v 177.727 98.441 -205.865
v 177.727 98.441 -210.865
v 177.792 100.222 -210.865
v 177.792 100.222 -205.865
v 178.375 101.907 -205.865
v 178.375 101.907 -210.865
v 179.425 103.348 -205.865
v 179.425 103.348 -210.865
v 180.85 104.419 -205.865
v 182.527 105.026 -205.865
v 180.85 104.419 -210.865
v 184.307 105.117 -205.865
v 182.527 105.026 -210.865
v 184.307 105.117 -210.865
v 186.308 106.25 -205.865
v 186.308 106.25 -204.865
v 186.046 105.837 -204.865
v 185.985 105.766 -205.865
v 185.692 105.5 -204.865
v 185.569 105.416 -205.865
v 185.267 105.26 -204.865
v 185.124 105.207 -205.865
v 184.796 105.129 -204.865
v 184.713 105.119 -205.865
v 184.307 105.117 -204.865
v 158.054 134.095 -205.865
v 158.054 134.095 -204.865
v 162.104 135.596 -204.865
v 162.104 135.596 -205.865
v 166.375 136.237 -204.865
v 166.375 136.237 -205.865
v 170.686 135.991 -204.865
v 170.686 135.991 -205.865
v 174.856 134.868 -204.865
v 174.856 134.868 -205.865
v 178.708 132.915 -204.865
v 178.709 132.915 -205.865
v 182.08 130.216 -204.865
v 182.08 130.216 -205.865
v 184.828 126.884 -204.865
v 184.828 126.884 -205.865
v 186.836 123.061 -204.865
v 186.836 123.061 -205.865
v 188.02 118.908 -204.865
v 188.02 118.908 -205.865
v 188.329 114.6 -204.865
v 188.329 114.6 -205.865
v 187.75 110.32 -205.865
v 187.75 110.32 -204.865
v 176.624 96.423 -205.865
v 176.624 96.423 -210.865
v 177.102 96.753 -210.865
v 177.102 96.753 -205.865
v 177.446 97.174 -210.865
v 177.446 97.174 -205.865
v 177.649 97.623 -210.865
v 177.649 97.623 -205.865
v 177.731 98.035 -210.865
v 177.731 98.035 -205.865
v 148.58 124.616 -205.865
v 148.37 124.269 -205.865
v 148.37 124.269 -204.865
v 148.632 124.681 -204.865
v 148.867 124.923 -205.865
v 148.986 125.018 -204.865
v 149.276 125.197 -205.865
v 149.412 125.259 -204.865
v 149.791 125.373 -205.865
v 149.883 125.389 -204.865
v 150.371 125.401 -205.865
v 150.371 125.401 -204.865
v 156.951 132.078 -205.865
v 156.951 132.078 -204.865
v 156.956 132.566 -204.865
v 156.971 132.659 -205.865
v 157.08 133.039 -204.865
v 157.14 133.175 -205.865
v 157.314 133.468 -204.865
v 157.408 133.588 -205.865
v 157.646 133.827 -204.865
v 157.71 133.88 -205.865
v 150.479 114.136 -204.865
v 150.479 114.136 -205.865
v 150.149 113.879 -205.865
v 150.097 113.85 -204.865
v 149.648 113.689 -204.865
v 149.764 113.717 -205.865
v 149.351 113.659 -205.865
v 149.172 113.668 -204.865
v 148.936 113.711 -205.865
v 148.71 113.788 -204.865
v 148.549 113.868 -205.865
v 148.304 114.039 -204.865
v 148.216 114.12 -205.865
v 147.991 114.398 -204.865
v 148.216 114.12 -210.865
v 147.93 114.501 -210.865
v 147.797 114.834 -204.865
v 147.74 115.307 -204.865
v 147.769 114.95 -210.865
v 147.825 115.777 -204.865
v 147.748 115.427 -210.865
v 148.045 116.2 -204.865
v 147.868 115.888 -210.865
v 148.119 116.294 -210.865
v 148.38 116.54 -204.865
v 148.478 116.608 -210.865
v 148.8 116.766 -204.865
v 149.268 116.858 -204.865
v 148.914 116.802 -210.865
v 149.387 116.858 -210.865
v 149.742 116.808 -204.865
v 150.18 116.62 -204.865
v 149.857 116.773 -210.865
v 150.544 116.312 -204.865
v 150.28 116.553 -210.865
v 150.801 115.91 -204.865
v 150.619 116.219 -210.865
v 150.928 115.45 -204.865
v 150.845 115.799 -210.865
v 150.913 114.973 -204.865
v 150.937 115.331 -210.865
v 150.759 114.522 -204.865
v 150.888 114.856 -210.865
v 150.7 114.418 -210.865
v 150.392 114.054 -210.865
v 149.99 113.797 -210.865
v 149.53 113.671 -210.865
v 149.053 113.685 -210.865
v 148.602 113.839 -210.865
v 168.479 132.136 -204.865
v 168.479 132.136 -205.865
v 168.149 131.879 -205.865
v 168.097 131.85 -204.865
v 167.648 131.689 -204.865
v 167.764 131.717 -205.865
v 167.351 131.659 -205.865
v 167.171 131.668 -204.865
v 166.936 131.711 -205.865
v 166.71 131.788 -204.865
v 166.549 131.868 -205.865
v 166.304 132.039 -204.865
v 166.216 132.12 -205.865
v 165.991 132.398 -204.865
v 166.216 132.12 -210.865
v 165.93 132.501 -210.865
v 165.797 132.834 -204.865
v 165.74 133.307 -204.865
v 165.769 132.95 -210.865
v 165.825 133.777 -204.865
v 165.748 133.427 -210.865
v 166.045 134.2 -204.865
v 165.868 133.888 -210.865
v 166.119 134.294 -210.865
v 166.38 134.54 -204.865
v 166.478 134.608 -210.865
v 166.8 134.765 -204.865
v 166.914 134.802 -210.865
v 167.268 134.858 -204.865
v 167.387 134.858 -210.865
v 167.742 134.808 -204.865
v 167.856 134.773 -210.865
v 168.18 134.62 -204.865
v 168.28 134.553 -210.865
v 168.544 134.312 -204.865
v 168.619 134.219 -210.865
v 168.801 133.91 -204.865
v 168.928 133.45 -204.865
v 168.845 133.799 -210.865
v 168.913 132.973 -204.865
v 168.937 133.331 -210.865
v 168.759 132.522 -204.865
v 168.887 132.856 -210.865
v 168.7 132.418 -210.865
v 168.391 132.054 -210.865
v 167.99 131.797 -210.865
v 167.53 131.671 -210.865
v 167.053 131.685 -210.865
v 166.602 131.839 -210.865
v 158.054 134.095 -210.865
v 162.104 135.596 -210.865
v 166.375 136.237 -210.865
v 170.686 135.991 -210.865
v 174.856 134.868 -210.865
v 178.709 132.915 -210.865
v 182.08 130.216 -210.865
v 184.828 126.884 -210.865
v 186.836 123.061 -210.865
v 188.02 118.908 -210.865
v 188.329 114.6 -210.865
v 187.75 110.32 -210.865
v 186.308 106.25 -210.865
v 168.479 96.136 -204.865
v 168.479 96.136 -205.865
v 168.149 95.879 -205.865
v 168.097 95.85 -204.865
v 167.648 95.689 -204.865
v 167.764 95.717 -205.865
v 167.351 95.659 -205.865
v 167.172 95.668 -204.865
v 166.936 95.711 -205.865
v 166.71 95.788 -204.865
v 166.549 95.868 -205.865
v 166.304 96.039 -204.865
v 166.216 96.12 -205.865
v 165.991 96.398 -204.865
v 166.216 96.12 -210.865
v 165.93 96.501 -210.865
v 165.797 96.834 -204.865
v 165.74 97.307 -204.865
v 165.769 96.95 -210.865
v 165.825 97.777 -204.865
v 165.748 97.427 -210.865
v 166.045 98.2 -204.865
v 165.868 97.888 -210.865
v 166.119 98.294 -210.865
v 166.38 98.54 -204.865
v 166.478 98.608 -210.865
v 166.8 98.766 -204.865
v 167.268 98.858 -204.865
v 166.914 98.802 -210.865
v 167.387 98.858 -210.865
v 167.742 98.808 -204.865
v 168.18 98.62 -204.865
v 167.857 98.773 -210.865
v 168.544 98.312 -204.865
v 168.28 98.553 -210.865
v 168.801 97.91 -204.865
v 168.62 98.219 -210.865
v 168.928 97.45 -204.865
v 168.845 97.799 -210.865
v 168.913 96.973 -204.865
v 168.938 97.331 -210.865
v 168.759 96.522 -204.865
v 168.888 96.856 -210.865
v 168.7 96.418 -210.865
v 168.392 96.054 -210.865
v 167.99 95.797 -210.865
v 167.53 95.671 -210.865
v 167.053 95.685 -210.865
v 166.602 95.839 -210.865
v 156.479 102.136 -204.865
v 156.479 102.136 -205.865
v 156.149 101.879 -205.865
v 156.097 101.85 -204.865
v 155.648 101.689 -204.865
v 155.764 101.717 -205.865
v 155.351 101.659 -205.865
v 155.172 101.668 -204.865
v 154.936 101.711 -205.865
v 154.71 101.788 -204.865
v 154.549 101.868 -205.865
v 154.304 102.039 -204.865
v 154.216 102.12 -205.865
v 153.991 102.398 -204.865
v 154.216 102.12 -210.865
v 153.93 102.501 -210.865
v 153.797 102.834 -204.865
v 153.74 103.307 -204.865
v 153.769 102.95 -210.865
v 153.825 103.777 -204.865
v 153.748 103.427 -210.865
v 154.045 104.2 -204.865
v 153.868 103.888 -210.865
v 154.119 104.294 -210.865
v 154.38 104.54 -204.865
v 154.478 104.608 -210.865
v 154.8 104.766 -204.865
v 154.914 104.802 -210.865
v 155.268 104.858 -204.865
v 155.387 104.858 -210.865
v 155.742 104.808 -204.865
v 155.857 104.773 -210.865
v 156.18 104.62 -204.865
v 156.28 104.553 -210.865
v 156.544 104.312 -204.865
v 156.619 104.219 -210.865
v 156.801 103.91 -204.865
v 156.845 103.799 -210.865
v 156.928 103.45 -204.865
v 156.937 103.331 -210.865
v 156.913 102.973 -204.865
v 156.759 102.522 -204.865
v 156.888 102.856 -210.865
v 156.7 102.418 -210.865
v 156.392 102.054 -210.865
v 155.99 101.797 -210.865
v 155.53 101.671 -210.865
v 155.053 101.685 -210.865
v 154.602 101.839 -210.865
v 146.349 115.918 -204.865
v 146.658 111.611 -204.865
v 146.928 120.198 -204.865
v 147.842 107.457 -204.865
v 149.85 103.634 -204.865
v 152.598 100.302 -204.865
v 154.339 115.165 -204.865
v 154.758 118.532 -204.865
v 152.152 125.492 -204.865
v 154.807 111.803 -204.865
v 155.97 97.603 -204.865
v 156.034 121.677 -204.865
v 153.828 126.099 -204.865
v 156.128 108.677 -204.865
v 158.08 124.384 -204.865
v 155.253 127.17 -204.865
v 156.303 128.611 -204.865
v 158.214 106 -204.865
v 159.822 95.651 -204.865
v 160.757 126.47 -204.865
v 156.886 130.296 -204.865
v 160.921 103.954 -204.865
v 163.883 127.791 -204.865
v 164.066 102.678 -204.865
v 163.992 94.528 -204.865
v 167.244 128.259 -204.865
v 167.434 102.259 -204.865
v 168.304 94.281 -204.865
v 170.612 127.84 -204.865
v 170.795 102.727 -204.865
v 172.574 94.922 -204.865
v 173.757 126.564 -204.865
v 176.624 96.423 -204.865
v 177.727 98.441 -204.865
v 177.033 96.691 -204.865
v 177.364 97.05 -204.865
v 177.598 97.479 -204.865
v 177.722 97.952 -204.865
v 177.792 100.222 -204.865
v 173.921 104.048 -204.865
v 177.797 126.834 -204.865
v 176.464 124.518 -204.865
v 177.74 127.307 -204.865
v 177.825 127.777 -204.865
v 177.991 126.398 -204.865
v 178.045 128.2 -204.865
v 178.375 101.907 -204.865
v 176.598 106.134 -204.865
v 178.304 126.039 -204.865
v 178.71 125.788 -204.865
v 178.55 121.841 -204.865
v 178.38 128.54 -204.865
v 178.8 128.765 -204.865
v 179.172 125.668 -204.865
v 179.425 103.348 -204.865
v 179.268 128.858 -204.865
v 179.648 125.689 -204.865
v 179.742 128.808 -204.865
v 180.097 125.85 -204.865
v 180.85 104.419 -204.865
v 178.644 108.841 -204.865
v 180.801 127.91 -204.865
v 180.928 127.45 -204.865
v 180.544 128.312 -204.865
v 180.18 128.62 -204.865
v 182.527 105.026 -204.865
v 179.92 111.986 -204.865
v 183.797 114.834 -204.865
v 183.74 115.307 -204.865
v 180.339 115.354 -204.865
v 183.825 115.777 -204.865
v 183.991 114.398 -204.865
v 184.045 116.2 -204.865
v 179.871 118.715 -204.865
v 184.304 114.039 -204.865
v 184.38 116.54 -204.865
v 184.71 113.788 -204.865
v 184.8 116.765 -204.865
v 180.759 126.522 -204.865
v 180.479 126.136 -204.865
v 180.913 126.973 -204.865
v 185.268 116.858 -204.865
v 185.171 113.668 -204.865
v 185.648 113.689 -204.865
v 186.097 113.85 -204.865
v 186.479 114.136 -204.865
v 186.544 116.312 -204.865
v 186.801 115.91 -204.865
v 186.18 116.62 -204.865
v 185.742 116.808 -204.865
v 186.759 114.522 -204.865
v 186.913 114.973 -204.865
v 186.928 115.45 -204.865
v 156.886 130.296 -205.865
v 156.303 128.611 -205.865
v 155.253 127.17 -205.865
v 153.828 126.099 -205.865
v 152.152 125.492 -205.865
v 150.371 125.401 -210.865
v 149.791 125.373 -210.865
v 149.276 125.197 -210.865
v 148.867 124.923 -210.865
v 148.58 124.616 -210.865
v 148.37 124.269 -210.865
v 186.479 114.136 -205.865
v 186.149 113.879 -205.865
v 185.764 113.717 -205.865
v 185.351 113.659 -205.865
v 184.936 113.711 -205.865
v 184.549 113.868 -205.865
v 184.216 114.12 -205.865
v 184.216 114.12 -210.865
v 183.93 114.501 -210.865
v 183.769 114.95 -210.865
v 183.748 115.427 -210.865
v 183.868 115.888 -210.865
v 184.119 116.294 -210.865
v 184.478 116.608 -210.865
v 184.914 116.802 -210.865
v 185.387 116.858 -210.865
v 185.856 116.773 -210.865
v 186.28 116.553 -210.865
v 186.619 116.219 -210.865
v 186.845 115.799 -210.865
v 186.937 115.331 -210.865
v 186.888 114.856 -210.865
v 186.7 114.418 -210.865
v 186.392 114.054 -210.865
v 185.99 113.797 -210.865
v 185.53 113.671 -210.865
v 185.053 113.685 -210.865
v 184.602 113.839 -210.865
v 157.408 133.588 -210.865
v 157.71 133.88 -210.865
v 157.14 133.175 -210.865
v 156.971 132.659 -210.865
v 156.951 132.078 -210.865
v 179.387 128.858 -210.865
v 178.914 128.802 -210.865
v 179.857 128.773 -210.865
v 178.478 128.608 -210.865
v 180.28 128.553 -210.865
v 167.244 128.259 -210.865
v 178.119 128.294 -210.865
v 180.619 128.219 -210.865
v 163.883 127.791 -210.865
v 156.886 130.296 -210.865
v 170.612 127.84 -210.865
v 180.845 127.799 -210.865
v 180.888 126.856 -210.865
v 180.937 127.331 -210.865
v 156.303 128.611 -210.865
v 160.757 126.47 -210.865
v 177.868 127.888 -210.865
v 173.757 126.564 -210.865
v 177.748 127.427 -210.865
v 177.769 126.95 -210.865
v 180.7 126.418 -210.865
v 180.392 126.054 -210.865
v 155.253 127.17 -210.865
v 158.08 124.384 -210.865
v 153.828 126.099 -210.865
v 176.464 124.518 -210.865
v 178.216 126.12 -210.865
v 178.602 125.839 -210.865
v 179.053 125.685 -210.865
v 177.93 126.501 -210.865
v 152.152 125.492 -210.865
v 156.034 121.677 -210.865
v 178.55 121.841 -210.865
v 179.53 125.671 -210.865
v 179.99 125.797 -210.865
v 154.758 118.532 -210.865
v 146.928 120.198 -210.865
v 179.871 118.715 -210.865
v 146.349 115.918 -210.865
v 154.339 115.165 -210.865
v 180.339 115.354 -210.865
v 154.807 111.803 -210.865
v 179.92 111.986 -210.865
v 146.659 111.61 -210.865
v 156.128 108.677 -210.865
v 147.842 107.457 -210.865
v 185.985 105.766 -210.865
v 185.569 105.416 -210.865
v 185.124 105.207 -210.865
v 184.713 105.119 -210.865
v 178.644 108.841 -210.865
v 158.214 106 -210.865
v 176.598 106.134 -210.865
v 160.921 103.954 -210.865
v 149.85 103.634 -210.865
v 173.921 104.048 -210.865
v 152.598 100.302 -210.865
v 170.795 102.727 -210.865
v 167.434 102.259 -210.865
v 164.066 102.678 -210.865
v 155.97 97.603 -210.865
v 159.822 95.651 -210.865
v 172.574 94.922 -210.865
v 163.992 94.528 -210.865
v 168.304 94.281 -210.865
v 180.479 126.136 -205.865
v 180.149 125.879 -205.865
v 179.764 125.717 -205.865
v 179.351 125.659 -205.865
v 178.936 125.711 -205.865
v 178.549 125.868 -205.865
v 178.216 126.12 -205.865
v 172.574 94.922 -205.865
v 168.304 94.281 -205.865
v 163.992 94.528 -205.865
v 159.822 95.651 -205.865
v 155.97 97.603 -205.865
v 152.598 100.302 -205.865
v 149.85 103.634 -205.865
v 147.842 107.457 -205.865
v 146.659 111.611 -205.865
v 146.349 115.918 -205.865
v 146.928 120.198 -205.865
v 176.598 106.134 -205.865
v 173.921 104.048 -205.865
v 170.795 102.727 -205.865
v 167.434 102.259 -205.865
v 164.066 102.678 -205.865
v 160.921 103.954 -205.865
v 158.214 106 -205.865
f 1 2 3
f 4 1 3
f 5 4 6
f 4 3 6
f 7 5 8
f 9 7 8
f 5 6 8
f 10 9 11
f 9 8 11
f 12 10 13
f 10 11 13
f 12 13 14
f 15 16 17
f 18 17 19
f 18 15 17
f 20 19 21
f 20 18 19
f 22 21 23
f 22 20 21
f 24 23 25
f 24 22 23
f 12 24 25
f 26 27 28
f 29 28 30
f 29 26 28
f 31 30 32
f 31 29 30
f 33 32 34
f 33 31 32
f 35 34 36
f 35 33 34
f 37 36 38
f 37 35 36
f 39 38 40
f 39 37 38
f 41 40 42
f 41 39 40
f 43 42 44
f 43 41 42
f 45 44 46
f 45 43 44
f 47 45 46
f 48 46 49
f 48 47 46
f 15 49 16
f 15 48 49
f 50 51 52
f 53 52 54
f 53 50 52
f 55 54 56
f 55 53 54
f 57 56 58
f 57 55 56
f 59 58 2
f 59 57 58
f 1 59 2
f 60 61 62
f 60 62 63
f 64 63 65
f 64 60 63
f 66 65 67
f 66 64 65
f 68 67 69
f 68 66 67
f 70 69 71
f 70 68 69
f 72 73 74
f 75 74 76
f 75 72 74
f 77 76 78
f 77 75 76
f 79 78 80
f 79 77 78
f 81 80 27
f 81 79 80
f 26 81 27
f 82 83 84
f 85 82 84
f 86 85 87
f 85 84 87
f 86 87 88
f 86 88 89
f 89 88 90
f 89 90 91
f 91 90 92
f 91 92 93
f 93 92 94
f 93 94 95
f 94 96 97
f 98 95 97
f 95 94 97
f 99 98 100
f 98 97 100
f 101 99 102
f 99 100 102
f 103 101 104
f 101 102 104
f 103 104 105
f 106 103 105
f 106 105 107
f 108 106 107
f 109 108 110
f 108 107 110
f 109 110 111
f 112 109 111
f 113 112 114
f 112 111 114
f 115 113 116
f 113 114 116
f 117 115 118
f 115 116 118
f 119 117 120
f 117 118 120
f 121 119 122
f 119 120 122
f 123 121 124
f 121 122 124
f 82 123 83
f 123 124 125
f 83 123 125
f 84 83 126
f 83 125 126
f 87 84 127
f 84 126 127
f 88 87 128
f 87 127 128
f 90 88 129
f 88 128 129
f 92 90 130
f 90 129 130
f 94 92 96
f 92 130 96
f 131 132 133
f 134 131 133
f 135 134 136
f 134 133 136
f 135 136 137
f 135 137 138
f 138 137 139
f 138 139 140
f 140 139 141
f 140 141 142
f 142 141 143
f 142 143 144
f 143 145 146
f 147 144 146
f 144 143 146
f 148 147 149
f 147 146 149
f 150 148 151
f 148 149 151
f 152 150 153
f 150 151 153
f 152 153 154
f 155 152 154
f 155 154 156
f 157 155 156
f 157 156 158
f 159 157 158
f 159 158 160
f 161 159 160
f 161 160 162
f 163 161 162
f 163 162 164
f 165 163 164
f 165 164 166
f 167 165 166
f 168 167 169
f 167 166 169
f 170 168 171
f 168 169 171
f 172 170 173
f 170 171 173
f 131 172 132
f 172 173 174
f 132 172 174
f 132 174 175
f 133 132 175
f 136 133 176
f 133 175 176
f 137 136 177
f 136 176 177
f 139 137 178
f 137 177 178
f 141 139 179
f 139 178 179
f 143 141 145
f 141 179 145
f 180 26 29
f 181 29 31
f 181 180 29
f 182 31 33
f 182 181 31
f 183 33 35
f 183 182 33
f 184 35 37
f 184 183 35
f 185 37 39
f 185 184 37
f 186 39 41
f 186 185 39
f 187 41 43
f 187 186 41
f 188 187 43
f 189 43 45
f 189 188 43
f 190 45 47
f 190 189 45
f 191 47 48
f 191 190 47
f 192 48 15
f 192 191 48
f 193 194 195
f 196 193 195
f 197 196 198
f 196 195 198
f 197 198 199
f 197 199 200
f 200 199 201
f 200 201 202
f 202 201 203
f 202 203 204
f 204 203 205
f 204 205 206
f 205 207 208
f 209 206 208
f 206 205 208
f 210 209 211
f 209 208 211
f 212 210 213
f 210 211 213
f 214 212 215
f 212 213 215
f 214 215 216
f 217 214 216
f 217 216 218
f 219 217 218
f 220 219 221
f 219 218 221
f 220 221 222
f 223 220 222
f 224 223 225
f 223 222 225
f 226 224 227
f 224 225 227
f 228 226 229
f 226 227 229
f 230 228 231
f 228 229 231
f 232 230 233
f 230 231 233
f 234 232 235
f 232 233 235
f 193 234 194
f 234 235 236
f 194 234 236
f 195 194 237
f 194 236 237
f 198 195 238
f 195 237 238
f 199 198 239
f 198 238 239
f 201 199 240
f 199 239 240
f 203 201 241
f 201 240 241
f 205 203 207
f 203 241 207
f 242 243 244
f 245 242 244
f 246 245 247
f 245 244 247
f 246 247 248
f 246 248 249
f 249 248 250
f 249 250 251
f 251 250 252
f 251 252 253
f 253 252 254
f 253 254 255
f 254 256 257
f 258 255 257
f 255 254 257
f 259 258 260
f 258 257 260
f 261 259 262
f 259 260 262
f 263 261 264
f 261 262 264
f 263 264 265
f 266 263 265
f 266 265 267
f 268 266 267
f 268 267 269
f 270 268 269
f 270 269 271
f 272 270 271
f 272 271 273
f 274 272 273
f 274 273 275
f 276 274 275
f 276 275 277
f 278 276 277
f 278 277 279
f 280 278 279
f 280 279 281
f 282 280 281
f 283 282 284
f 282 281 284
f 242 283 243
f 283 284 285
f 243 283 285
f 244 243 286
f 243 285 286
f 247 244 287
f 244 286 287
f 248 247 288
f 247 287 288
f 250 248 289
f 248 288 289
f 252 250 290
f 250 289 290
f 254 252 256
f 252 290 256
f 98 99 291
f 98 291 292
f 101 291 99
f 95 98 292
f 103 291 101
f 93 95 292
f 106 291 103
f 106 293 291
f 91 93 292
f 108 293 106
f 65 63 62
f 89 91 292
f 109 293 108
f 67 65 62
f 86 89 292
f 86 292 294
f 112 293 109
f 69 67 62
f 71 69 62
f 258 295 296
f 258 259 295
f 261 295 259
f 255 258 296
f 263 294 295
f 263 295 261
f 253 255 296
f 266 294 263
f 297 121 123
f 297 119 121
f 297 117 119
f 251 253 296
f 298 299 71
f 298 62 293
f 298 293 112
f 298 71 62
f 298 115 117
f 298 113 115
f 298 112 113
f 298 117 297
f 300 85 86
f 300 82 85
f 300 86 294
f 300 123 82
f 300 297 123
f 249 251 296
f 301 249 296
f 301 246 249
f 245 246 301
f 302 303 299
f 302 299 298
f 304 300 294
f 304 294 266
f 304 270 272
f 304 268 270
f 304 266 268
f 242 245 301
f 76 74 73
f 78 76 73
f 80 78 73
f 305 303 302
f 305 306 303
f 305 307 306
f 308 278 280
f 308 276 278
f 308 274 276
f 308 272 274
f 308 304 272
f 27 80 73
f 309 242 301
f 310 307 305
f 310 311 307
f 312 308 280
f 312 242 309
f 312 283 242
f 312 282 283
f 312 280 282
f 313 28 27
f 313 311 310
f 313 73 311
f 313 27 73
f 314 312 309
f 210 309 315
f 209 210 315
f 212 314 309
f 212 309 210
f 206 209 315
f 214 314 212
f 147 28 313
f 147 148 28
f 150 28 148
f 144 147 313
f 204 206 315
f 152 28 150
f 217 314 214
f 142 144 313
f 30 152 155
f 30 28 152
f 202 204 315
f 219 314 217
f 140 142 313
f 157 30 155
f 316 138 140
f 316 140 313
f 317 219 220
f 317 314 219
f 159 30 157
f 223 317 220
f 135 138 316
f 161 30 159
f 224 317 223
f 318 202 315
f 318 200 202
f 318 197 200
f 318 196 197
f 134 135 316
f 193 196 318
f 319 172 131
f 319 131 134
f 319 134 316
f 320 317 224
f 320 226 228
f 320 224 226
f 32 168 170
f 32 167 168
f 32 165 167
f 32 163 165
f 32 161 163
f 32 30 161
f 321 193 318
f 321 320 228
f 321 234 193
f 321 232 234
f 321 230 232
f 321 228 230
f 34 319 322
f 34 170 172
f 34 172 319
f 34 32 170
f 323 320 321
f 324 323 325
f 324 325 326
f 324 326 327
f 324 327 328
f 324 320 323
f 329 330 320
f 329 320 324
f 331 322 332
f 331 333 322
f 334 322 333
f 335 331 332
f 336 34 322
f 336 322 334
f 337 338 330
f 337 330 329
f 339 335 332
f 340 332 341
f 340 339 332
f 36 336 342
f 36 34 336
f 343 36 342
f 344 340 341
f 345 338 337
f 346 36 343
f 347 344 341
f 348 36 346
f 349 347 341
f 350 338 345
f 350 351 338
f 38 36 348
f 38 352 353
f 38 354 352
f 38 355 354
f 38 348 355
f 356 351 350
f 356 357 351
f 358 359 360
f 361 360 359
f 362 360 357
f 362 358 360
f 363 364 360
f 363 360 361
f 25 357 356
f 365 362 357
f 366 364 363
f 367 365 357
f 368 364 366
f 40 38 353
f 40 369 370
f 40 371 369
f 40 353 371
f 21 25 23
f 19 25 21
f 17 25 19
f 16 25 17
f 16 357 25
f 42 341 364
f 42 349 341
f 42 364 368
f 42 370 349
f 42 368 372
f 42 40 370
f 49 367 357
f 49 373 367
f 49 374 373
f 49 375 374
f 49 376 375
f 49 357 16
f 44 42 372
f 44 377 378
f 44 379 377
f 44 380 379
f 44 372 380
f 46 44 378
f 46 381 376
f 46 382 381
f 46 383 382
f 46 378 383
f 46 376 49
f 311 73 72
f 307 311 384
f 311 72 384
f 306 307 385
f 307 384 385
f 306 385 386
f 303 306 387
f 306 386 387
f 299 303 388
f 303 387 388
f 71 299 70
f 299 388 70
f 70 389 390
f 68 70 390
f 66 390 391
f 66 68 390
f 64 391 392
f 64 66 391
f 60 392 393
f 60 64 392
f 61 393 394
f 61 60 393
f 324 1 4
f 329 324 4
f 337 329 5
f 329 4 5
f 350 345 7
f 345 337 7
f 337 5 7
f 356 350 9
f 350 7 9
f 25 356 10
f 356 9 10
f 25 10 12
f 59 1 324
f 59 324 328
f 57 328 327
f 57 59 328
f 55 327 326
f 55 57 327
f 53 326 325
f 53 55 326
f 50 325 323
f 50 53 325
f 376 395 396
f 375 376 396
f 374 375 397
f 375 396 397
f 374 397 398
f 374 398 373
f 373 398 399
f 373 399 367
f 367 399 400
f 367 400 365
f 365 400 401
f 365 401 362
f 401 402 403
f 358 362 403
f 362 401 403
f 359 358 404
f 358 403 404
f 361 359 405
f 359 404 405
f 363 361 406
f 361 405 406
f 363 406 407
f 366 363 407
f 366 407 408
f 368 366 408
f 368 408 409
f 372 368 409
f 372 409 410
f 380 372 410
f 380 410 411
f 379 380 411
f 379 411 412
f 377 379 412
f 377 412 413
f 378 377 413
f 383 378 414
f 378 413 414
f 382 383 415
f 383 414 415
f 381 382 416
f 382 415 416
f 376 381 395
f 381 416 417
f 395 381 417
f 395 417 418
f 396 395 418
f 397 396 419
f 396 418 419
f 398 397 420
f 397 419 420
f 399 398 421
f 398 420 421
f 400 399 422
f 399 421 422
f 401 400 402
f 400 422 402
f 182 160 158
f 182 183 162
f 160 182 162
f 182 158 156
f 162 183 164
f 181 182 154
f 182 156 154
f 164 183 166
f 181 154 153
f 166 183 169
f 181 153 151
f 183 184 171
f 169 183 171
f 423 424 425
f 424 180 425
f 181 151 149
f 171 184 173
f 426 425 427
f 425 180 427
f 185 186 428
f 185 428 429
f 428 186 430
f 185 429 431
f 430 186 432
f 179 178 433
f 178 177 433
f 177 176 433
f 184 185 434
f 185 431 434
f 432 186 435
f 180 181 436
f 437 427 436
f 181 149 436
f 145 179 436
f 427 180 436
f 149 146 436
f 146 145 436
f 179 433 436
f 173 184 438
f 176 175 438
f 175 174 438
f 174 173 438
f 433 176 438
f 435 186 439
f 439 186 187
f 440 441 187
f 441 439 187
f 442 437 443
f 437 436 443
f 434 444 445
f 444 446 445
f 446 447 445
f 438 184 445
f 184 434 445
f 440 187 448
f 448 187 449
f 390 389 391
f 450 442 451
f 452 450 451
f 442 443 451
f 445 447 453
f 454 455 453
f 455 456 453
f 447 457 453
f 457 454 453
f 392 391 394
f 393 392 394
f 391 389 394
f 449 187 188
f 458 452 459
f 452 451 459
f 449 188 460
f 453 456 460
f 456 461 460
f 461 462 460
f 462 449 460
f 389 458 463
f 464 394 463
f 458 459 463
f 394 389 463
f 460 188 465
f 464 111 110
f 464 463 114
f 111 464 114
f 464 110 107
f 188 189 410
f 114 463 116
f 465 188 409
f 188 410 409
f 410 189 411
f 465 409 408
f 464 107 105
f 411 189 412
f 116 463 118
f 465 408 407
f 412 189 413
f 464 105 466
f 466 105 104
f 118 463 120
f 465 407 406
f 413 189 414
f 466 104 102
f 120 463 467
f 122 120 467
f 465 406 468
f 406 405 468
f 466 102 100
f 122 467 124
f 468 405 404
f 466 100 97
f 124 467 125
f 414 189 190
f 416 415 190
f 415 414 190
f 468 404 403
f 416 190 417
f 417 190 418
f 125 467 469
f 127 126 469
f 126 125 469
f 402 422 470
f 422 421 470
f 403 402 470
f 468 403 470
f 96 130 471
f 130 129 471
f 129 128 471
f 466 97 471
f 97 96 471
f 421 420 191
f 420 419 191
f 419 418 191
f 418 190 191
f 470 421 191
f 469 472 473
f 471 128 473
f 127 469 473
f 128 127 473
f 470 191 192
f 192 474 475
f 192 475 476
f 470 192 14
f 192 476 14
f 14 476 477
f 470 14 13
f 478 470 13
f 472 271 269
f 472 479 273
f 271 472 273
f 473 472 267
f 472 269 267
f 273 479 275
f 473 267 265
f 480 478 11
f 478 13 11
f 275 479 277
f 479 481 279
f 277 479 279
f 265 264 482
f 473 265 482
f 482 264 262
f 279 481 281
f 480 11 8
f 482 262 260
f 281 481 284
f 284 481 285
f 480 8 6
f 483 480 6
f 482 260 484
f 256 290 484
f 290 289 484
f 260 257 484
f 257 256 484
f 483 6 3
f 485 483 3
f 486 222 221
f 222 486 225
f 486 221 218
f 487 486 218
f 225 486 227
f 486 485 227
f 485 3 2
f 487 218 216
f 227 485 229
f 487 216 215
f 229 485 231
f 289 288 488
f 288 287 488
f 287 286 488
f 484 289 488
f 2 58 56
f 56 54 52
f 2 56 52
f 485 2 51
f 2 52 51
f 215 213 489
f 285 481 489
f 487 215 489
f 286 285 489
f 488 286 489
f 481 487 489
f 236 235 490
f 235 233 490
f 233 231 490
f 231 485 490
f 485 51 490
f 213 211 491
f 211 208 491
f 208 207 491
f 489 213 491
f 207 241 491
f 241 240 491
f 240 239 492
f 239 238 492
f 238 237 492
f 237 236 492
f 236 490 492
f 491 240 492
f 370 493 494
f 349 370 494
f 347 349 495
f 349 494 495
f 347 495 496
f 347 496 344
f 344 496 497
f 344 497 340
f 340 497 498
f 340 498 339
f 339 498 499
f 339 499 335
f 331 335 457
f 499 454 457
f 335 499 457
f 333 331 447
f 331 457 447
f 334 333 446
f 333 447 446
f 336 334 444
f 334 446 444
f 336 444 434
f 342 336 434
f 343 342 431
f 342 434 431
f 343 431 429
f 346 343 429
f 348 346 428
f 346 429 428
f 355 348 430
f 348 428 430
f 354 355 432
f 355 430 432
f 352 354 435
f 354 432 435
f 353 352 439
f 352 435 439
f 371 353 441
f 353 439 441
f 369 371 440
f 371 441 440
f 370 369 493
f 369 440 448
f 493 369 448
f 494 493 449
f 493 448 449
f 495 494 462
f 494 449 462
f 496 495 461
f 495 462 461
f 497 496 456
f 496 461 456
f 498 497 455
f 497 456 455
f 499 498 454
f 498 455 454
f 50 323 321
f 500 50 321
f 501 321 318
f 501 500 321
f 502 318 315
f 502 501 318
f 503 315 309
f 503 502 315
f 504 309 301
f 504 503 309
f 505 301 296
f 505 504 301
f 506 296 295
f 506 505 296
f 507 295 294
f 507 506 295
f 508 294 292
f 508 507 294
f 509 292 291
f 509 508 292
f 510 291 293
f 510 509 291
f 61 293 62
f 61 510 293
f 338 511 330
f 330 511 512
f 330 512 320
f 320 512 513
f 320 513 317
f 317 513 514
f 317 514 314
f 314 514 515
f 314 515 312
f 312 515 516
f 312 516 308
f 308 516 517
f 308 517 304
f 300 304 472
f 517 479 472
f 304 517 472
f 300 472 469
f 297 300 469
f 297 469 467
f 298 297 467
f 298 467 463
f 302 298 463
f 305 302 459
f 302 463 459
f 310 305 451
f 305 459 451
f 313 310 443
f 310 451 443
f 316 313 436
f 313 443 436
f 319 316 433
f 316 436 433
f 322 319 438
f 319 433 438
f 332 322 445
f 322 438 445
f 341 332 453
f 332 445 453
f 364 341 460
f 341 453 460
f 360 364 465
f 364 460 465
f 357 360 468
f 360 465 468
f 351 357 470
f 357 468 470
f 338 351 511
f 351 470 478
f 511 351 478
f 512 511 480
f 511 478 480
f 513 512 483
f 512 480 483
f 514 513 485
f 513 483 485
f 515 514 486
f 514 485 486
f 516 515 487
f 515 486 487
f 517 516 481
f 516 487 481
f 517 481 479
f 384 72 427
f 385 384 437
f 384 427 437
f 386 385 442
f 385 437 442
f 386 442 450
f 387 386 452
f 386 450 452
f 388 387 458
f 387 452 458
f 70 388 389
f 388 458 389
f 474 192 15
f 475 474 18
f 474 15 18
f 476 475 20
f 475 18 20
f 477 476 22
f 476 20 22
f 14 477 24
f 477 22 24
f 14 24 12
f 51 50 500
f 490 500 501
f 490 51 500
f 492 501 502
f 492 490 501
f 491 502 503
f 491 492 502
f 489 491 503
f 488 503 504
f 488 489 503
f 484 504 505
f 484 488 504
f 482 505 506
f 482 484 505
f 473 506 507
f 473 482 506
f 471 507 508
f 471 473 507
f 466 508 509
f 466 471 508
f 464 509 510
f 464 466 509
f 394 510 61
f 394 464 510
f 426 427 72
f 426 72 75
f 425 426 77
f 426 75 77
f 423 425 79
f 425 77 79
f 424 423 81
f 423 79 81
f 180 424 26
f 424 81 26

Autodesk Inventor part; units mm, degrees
ref_plane "YZ Plane" through (0, 0, 0) normal (1, 0, 0) x (0, 1, 0)
ref_plane "XZ Plane" through (0, 0, 0) normal (0, 1, 0) x (-1, 0, 0)
ref_plane "작업 평면1" through (168.9405, 113.6809, -210.8653) normal (0, 0, 1) x (-0.7019406, -0.7122354, 0)
sketch "스케치1" plane through (168.9405, 113.6809, -210.8653) normal (0, 0, 1) x (-0.7019406, -0.7122354, 0)
  circle A0 centre (0, -25.2484) radius 3 projected
  circle A1 centre (0, -2.2484) radius 13 projected
  circle A2 centre (-12.6349, 10.5718) radius 1.6 projected
  circle A3 centre (12.6349, -15.0687) radius 1.6 projected
  circle A4 centre (0.1235, 14.7217) radius 1.6 projected
  circle A5 centre (-0.1235, -19.2186) radius 1.6 projected
  circle A6 centre (-16.9701, -2.1249) radius 1.6 projected
  circle A7 centre (16.9701, -2.372) radius 1.6 projected
  circle A8 centre (12.8202, 10.3865) radius 1.6 projected
  circle A9 centre (-12.8202, -14.8834) radius 1.6 projected
  circle A10 centre (0, 20.7516) radius 3 projected
  arc A11 (-2.0317, -50.1272) -> (-0.57, -54.2453) centre (7.4248, -49.0892) ccw projected
  line L0 (0.57, -54.2453) -> (-0.57, -54.2453) projected
  arc A12 (0.57, -54.2453) -> (2.0317, -50.1272) centre (-7.4248, -49.0892) ccw projected
  arc A13 (2.5023, -49.6825) -> (2.0317, -50.1272) centre (2.5287, -50.1818) ccw projected
  arc A14 (2.5023, -49.6825) -> (3.4624, -49.6221) centre (0, -2.2484) ccw projected
  arc A15 (3.9852, -50.0043) -> (3.4624, -49.6221) centre (3.4989, -50.1207) ccw projected
  arc A16 (3.9852, -50.0043) -> (5.9514, -53.9067) centre (13.237, -47.7893) ccw projected
  line L1 (7.0824, -53.7639) -> (5.9514, -53.9067) projected
  arc A17 (7.0824, -53.7639) -> (8.0165, -49.4951) centre (-1.4956, -49.6504) ccw projected
  arc A18 (8.4277, -48.9948) -> (8.0165, -49.4951) centre (8.5164, -49.4869) ccw projected
  arc A19 (8.4277, -48.9948) -> (9.3726, -48.8146) centre (0, -2.2484) ccw projected
  arc A20 (9.9391, -49.1283) -> (9.3726, -48.8146) centre (9.4713, -49.3047) ccw projected
  arc A21 (9.9391, -49.1283) -> (12.379, -52.7535) centre (18.8404, -45.7711) ccw projected
  line L2 (13.4832, -52.47) -> (12.379, -52.7535) projected
  arc A22 (13.4832, -52.47) -> (13.8748, -48.1178) centre (4.4572, -49.4641) ccw projected
  arc A23 (14.2201, -47.5699) -> (13.8748, -48.1178) centre (14.3698, -48.047) ccw projected
  arc A24 (14.2201, -47.5699) -> (15.135, -47.2727) centre (0, -2.2484) ccw projected
  arc A25 (15.7364, -47.5129) -> (15.135, -47.2727) centre (15.2943, -47.7466) ccw projected
  arc A26 (15.7364, -47.5129) -> (18.6114, -50.8037) centre (24.1467, -43.0666) ccw projected
  line L3 (19.6713, -50.3841) -> (18.6114, -50.8037) projected
  arc A27 (19.6713, -50.3841) -> (19.5144, -46.0171) centre (10.3398, -48.5331) ccw projected
  arc A28 (19.7883, -45.4303) -> (19.5144, -46.0171) centre (19.9966, -45.8849) ccw projected
  arc A29 (19.7883, -45.4303) -> (20.6587, -45.0207) centre (0, -2.2484) ccw projected
  arc A30 (21.2854, -45.1837) -> (20.6587, -45.0207) centre (20.8762, -45.471) ccw projected
  arc A31 (21.2854, -45.1837) -> (24.5502, -48.0882) centre (29.0721, -39.7184) ccw projected
  line L4 (25.5492, -47.539) -> (24.5502, -48.0882) projected
  arc A32 (25.5492, -47.539) -> (24.8461, -43.2262) centre (16.0593, -46.8722) ccw projected
  arc A33 (25.0443, -42.6097) -> (24.8461, -43.2262) centre (25.308, -43.0345) ccw projected
  arc A34 (25.0443, -42.6097) -> (25.8566, -42.0942) centre (0, -2.2484) ccw projected
  arc A35 (26.4988, -42.1774) -> (25.8566, -42.0942) centre (26.1288, -42.5137) ccw projected
  arc A36 (26.4988, -42.1774) -> (30.1019, -44.6498) centre (33.5391, -35.7792) ccw projected
  line L5 (31.0241, -43.9798) -> (30.1019, -44.6498) projected
  arc A37 (31.0241, -43.9798) -> (29.7861, -39.789) centre (21.5255, -44.5076) ccw projected
  arc A38 (29.9055, -39.1525) -> (29.7861, -39.789) centre (30.2203, -39.541) ccw projected
  arc A39 (29.9055, -39.1525) -> (30.6467, -38.5393) centre (0, -2.2484) ccw projected
  arc A40 (31.2943, -38.5413) -> (30.6467, -38.5393) centre (30.9693, -38.9213) ccw projected
  arc A41 (31.2943, -38.5413) -> (35.1788, -40.5427) centre (37.4772, -31.3112) ccw projected
  line L6 (36.0098, -39.7623) -> (35.1788, -40.5427) projected
  arc A42 (36.0098, -39.7623) -> (34.2563, -35.7598) centre (26.6522, -41.4765) ccw projected
  arc A43 (34.295, -35.1134) -> (34.2563, -35.7598) centre (34.656, -35.4593) ccw projected
  arc A44 (34.295, -35.1134) -> (34.9535, -34.4121) centre (0, -2.2484) ccw projected
  arc A45 (35.5962, -34.333) -> (34.9535, -34.4121) centre (35.3214, -34.7507) ccw projected
  arc A46 (35.5962, -34.333) -> (39.7009, -35.8317) centre (40.8242, -26.3849) ccw projected
  line L7 (40.4276, -34.9533) -> (39.7009, -35.8317) projected
  arc A47 (40.4276, -34.9533) -> (38.1863, -31.2021) centre (31.3586, -37.8268) ccw projected
  arc A48 (38.1436, -30.5559) -> (38.1863, -31.2021) centre (38.5451, -30.8539) ccw projected
  arc A49 (38.1436, -30.5559) -> (38.7091, -29.7777) centre (0, -2.2484) ccw projected
  arc A50 (39.3368, -29.6186) -> (38.7091, -29.7777) centre (39.1165, -30.0674) ccw projected
  arc A51 (39.3368, -29.6186) -> (43.597, -30.591) centre (43.5274, -21.078) ccw projected
  line L8 (44.2078, -29.6285) -> (43.597, -30.591) projected
  arc A52 (44.2078, -29.6285) -> (41.514, -26.1878) centre (35.5705, -33.616) ccw projected
  arc A53 (41.3907, -25.5521) -> (41.514, -26.1878) centre (41.8264, -25.7974) ccw projected
  arc A54 (41.3907, -25.5521) -> (41.8542, -24.7091) centre (0, -2.2484) ccw projected
  arc A55 (42.457, -24.4725) -> (41.8542, -24.7091) centre (42.2947, -24.9455) ccw projected
  arc A56 (42.457, -24.4725) -> (46.8055, -24.9034) centre (45.5441, -15.4741) ccw projected
  line L9 (47.2909, -23.8719) -> (46.8055, -24.9034) projected
  arc A57 (47.2909, -23.8719) -> (44.1871, -20.7959) centre (39.2214, -28.9105) ccw projected
  arc A58 (43.985, -20.1807) -> (44.1871, -20.7959) centre (44.4481, -20.3694) ccw projected
  arc A59 (43.985, -20.1807) -> (44.3392, -19.2862) centre (0, -2.2484) ccw projected
  arc A60 (44.9076, -18.976) -> (44.3392, -19.2862) centre (44.8059, -19.4656) ccw projected
  arc A61 (44.9076, -18.976) -> (49.2758, -18.8585) centre (46.8426, -9.6616) ccw projected
  line L10 (49.6281, -17.7743) -> (49.2758, -18.8585) projected
  arc A62 (49.6281, -17.7743) -> (46.1633, -15.1116) centre (42.2538, -23.7845) ccw projected
  arc A63 (45.8857, -14.5265) -> (46.1633, -15.1116) centre (46.3687, -14.6557) ccw projected
  arc A64 (45.8857, -14.5265) -> (46.125, -13.5947) centre (0, -2.2484) ccw projected
  arc A65 (46.65, -13.2157) -> (46.125, -13.5947) centre (46.6105, -13.7141) ccw projected
  arc A66 (46.65, -13.2157) -> (50.9691, -12.5516) centre (47.4023, -3.7322) ccw projected
  line L11 (51.1827, -11.4318) -> (50.9691, -12.5516) projected
  arc A67 (51.1827, -11.4318) -> (47.4114, -9.2243) centre (44.6198, -18.3188) ccw projected
  arc A68 (47.0627, -8.6787) -> (47.4114, -9.2243) centre (47.5581, -8.7464) ccw projected
  arc A69 (47.0627, -8.6787) -> (47.1833, -7.7243) centre (0, -2.2484) ccw projected
  arc A70 (47.6567, -7.2824) -> (47.1833, -7.7243) centre (47.68, -7.7819) ccw projected
  arc A71 (47.6567, -7.2824) -> (51.8585, -6.0822) centre (47.2145, 2.2206) ccw projected
  line L12 (51.9301, -4.9445) -> (51.8585, -6.0822) projected
  arc A72 (51.9301, -4.9445) -> (47.9119, -3.2271) centre (46.2821, -12.5998) ccw projected
  arc A73 (47.4976, -2.7294) -> (47.9119, -3.2271) centre (47.9975, -2.7345) ccw projected
  arc A74 (47.4976, -2.7294) -> (47.4976, -1.7674) centre (0, -2.2484) ccw projected
  arc A75 (47.9119, -1.2698) -> (47.4976, -1.7674) centre (47.9975, -1.7624) ccw projected
  arc A76 (47.9119, -1.2698) -> (51.9301, 0.4476) centre (46.2821, 8.1029) ccw projected
  line L13 (51.8585, 1.5853) -> (51.9301, 0.4476) projected
  arc A77 (51.8585, 1.5853) -> (47.6567, 2.7856) centre (47.2145, -6.7175) ccw projected
  arc A78 (47.1833, 3.2274) -> (47.6567, 2.7856) centre (47.68, 3.285) ccw projected
  arc A79 (47.1833, 3.2274) -> (47.0627, 4.1818) centre (0, -2.2484) ccw projected
  arc A80 (47.4114, 4.7275) -> (47.0627, 4.1818) centre (47.5581, 4.2495) ccw projected
  arc A81 (47.4114, 4.7275) -> (51.1827, 6.9349) centre (44.6198, 13.822) ccw projected
  line L14 (50.9691, 8.0547) -> (51.1827, 6.9349) projected
  arc A82 (50.9691, 8.0547) -> (46.65, 8.7188) centre (47.4023, -0.7647) ccw projected
  arc A83 (46.125, 9.0978) -> (46.65, 8.7188) centre (46.6105, 9.2173) ccw projected
  arc A84 (46.125, 9.0978) -> (45.8857, 10.0296) centre (0, -2.2484) ccw projected
  arc A85 (46.1633, 10.6147) -> (45.8857, 10.0296) centre (46.3687, 10.1589) ccw projected
  arc A86 (46.1633, 10.6147) -> (49.6281, 13.2774) centre (42.2538, 19.2876) ccw projected
  line L15 (49.2758, 14.3616) -> (49.6281, 13.2774) projected
  arc A87 (49.2758, 14.3616) -> (44.9076, 14.4792) centre (46.8426, 5.1647) ccw projected
  arc A88 (44.3392, 14.7894) -> (44.9076, 14.4792) centre (44.8059, 14.9687) ccw projected
  arc A89 (44.3392, 14.7894) -> (43.985, 15.6838) centre (0, -2.2484) ccw projected
  arc A90 (44.1871, 16.299) -> (43.985, 15.6838) centre (44.4481, 15.8726) ccw projected
  arc A91 (44.1871, 16.299) -> (47.2909, 19.375) centre (39.2214, 24.4136) ccw projected
  line L16 (46.8055, 20.4065) -> (47.2909, 19.375) projected
  arc A92 (46.8055, 20.4065) -> (42.457, 19.9757) centre (45.5441, 10.9772) ccw projected
  arc A93 (41.8542, 20.2122) -> (42.457, 19.9757) centre (42.2947, 20.4486) ccw projected
  arc A94 (41.8542, 20.2122) -> (41.3907, 21.0552) centre (0, -2.2484) ccw projected
  arc A95 (41.514, 21.6909) -> (41.3907, 21.0552) centre (41.8264, 21.3005) ccw projected
  arc A96 (41.514, 21.6909) -> (44.2078, 25.1316) centre (35.5705, 29.1191) ccw projected
  line L17 (43.597, 26.0941) -> (44.2078, 25.1316) projected
  arc A97 (43.597, 26.0941) -> (39.3368, 25.1217) centre (43.5274, 16.5811) ccw projected
  arc A98 (38.7091, 25.2808) -> (39.3368, 25.1217) centre (39.1165, 25.5706) ccw projected
  arc A99 (38.7091, 25.2808) -> (38.1436, 26.0591) centre (0, -2.2484) ccw projected
  arc A100 (38.1863, 26.7052) -> (38.1436, 26.0591) centre (38.5451, 26.357) ccw projected
  arc A101 (38.1863, 26.7052) -> (40.4276, 30.4564) centre (31.3586, 33.3299) ccw projected
  line L18 (39.7009, 31.3348) -> (40.4276, 30.4564) projected
  arc A102 (39.7009, 31.3348) -> (35.5962, 29.8361) centre (40.8242, 21.888) ccw projected
  arc A103 (34.9535, 29.9152) -> (35.5962, 29.8361) centre (35.3214, 30.2538) ccw projected
  arc A104 (34.9535, 29.9152) -> (34.295, 30.6165) centre (0, -2.2484) ccw projected
  arc A105 (34.2563, 31.2629) -> (34.295, 30.6165) centre (34.656, 30.9625) ccw projected
  arc A106 (34.2563, 31.2629) -> (36.0098, 35.2655) centre (26.6522, 36.9797) ccw projected
  line L19 (35.1788, 36.0458) -> (36.0098, 35.2655) projected
  arc A107 (35.1788, 36.0458) -> (31.2943, 34.0445) centre (37.4772, 26.8143) ccw projected
  arc A108 (30.6467, 34.0425) -> (31.2943, 34.0445) centre (30.9693, 34.4245) ccw projected
  arc A109 (30.6467, 34.0425) -> (29.9055, 34.6557) centre (0, -2.2484) ccw projected
  arc A110 (29.7861, 35.2921) -> (29.9055, 34.6557) centre (30.2203, 35.0441) ccw projected
  arc A111 (29.7861, 35.2921) -> (31.0241, 39.4829) centre (21.5255, 40.0107) ccw projected
  line L20 (30.1019, 40.153) -> (31.0241, 39.4829) projected
  arc A112 (30.1019, 40.153) -> (26.4988, 37.6805) centre (33.5391, 31.2823) ccw projected
  arc A113 (25.8566, 37.5973) -> (26.4988, 37.6805) centre (26.1288, 38.0168) ccw projected
  arc A114 (25.8566, 37.5973) -> (25.0443, 38.1128) centre (0, -2.2484) ccw projected
  arc A115 (24.8461, 38.7293) -> (25.0443, 38.1128) centre (25.308, 38.5377) ccw projected
  arc A116 (24.8461, 38.7293) -> (25.5492, 43.0422) centre (16.0593, 42.3754) ccw projected
  line L21 (24.5502, 43.5914) -> (25.5492, 43.0422) projected
  arc A117 (24.5502, 43.5914) -> (21.2854, 40.6868) centre (29.0721, 35.2215) ccw projected
  arc A118 (20.6587, 40.5238) -> (21.2854, 40.6868) centre (20.8762, 40.9741) ccw projected
  arc A119 (20.6587, 40.5238) -> (19.7883, 40.9334) centre (0, -2.2484) ccw projected
  arc A120 (19.5144, 41.5202) -> (19.7883, 40.9334) centre (19.9966, 41.388) ccw projected
  arc A121 (19.5144, 41.5202) -> (19.6713, 45.8872) centre (10.3398, 44.0363) ccw projected
  line L22 (18.6114, 46.3069) -> (19.6713, 45.8872) projected
  arc A122 (18.6114, 46.3069) -> (15.7364, 43.016) centre (24.1467, 38.5697) ccw projected
  arc A123 (15.135, 42.7758) -> (15.7364, 43.016) centre (15.2943, 43.2497) ccw projected
  arc A124 (15.135, 42.7758) -> (14.2201, 43.0731) centre (0, -2.2484) ccw projected
  arc A125 (13.8748, 43.6209) -> (14.2201, 43.0731) centre (14.3698, 43.5501) ccw projected
  arc A126 (13.8748, 43.6209) -> (13.4832, 47.9731) centre (4.4572, 44.9672) ccw projected
  line L23 (12.379, 48.2566) -> (13.4832, 47.9731) projected
  arc A127 (12.379, 48.2566) -> (9.9391, 44.6314) centre (18.8404, 41.2742) ccw projected
  arc A128 (9.3726, 44.3177) -> (9.9391, 44.6314) centre (9.4713, 44.8079) ccw projected
  arc A129 (9.3726, 44.3177) -> (8.4277, 44.4979) centre (0, -2.2484) ccw projected
  arc A130 (8.0165, 44.9982) -> (8.4277, 44.4979) centre (8.5164, 44.99) ccw projected
  arc A131 (8.0165, 44.9982) -> (7.0824, 49.267) centre (-1.4956, 45.1535) ccw projected
  line L24 (5.9514, 49.4099) -> (7.0824, 49.267) projected
  arc A132 (5.9514, 49.4099) -> (3.9852, 45.5074) centre (13.237, 43.2924) ccw projected
  arc A133 (3.4624, 45.1252) -> (3.9852, 45.5074) centre (3.4989, 45.6239) ccw projected
  arc A134 (3.4624, 45.1252) -> (2.5023, 45.1856) centre (0, -2.2484) ccw projected
  arc A135 (2.0317, 45.6304) -> (2.5023, 45.1856) centre (2.5287, 45.6849) ccw projected
  arc A136 (2.0317, 45.6304) -> (0.57, 49.7484) centre (-7.4248, 44.5923) ccw projected
  line L25 (-0.57, 49.7484) -> (0.57, 49.7484) projected
  arc A137 (-0.57, 49.7484) -> (-2.0317, 45.6304) centre (7.4248, 44.5923) ccw projected
  arc A138 (-2.5023, 45.1856) -> (-2.0317, 45.6304) centre (-2.5287, 45.6849) ccw projected
  arc A139 (-2.5023, 45.1856) -> (-3.4624, 45.1252) centre (0, -2.2484) ccw projected
  arc A140 (-3.9852, 45.5074) -> (-3.4624, 45.1252) centre (-3.4989, 45.6239) ccw projected
  arc A141 (-3.9852, 45.5074) -> (-5.9514, 49.4099) centre (-13.237, 43.2924) ccw projected
  line L26 (-7.0824, 49.267) -> (-5.9514, 49.4099) projected
  arc A142 (-7.0824, 49.267) -> (-8.0165, 44.9982) centre (1.4956, 45.1535) ccw projected
  arc A143 (-8.4277, 44.4979) -> (-8.0165, 44.9982) centre (-8.5164, 44.99) ccw projected
  arc A144 (-8.4277, 44.4979) -> (-9.3726, 44.3177) centre (0, -2.2484) ccw projected
  arc A145 (-9.9391, 44.6314) -> (-9.3726, 44.3177) centre (-9.4713, 44.8079) ccw projected
  arc A146 (-9.9391, 44.6314) -> (-12.379, 48.2566) centre (-18.8404, 41.2742) ccw projected
  line L27 (-13.4832, 47.9731) -> (-12.379, 48.2566) projected
  arc A147 (-13.4832, 47.9731) -> (-13.8748, 43.6209) centre (-4.4572, 44.9672) ccw projected
  arc A148 (-14.2201, 43.0731) -> (-13.8748, 43.6209) centre (-14.3698, 43.5501) ccw projected
  arc A149 (-14.2201, 43.0731) -> (-15.135, 42.7758) centre (0, -2.2484) ccw projected
  arc A150 (-15.7364, 43.016) -> (-15.135, 42.7758) centre (-15.2943, 43.2497) ccw projected
  arc A151 (-15.7364, 43.016) -> (-18.6114, 46.3069) centre (-24.1467, 38.5697) ccw projected
  line L28 (-19.6713, 45.8872) -> (-18.6114, 46.3069) projected
  arc A152 (-19.6713, 45.8872) -> (-19.5144, 41.5202) centre (-10.3398, 44.0363) ccw projected
  arc A153 (-19.7883, 40.9334) -> (-19.5144, 41.5202) centre (-19.9966, 41.388) ccw projected
  arc A154 (-19.7883, 40.9334) -> (-20.6587, 40.5238) centre (0, -2.2484) ccw projected
  arc A155 (-21.2854, 40.6868) -> (-20.6587, 40.5238) centre (-20.8762, 40.9741) ccw projected
  arc A156 (-21.2854, 40.6868) -> (-24.5502, 43.5914) centre (-29.0721, 35.2215) ccw projected
  line L29 (-25.5492, 43.0422) -> (-24.5502, 43.5914) projected
  arc A157 (-25.5492, 43.0422) -> (-24.8461, 38.7293) centre (-16.0593, 42.3754) ccw projected
  arc A158 (-25.0443, 38.1128) -> (-24.8461, 38.7293) centre (-25.308, 38.5377) ccw projected
  arc A159 (-25.0443, 38.1128) -> (-25.8566, 37.5973) centre (0, -2.2484) ccw projected
  arc A160 (-26.4988, 37.6805) -> (-25.8566, 37.5973) centre (-26.1288, 38.0168) ccw projected
  arc A161 (-26.4988, 37.6805) -> (-30.1019, 40.153) centre (-33.5391, 31.2823) ccw projected
  line L30 (-31.0241, 39.4829) -> (-30.1019, 40.153) projected
  arc A162 (-31.0241, 39.4829) -> (-29.7861, 35.2921) centre (-21.5255, 40.0107) ccw projected
  arc A163 (-29.9055, 34.6557) -> (-29.7861, 35.2921) centre (-30.2203, 35.0441) ccw projected
  arc A164 (-29.9055, 34.6557) -> (-30.6467, 34.0425) centre (0, -2.2484) ccw projected
  arc A165 (-31.2943, 34.0445) -> (-30.6467, 34.0425) centre (-30.9693, 34.4245) ccw projected
  arc A166 (-31.2943, 34.0445) -> (-35.1788, 36.0458) centre (-37.4772, 26.8143) ccw projected
  line L31 (-36.0098, 35.2655) -> (-35.1788, 36.0458) projected
  arc A167 (-36.0098, 35.2655) -> (-34.2563, 31.2629) centre (-26.6522, 36.9797) ccw projected
  arc A168 (-34.295, 30.6165) -> (-34.2563, 31.2629) centre (-34.656, 30.9625) ccw projected
  arc A169 (-34.295, 30.6165) -> (-34.9535, 29.9152) centre (0, -2.2484) ccw projected
  arc A170 (-35.5962, 29.8361) -> (-34.9535, 29.9152) centre (-35.3214, 30.2538) ccw projected
  arc A171 (-35.5962, 29.8361) -> (-39.7009, 31.3348) centre (-40.8242, 21.888) ccw projected
  line L32 (-40.4276, 30.4564) -> (-39.7009, 31.3348) projected
  arc A172 (-40.4276, 30.4564) -> (-38.1863, 26.7052) centre (-31.3586, 33.3299) ccw projected
  arc A173 (-38.1436, 26.0591) -> (-38.1863, 26.7052) centre (-38.5451, 26.357) ccw projected
  arc A174 (-38.1436, 26.0591) -> (-38.7091, 25.2808) centre (0, -2.2484) ccw projected
  arc A175 (-39.3368, 25.1217) -> (-38.7091, 25.2808) centre (-39.1165, 25.5706) ccw projected
  arc A176 (-39.3368, 25.1217) -> (-43.597, 26.0941) centre (-43.5274, 16.5811) ccw projected
  line L33 (-44.2078, 25.1316) -> (-43.597, 26.0941) projected
  arc A177 (-44.2078, 25.1316) -> (-41.514, 21.6909) centre (-35.5705, 29.1191) ccw projected
  arc A178 (-41.3907, 21.0552) -> (-41.514, 21.6909) centre (-41.8264, 21.3005) ccw projected
  arc A179 (-41.3907, 21.0552) -> (-41.8542, 20.2122) centre (0, -2.2484) ccw projected
  arc A180 (-42.457, 19.9757) -> (-41.8542, 20.2122) centre (-42.2947, 20.4486) ccw projected
  arc A181 (-42.457, 19.9757) -> (-46.8055, 20.4065) centre (-45.5441, 10.9772) ccw projected
  line L34 (-47.2909, 19.375) -> (-46.8055, 20.4065) projected
  arc A182 (-47.2909, 19.375) -> (-44.1871, 16.299) centre (-39.2214, 24.4136) ccw projected
  arc A183 (-43.985, 15.6838) -> (-44.1871, 16.299) centre (-44.4481, 15.8726) ccw projected
  arc A184 (-43.985, 15.6838) -> (-44.3392, 14.7894) centre (0, -2.2484) ccw projected
  arc A185 (-44.9076, 14.4792) -> (-44.3392, 14.7894) centre (-44.8059, 14.9687) ccw projected
  arc A186 (-44.9076, 14.4792) -> (-49.2758, 14.3616) centre (-46.8426, 5.1647) ccw projected
  line L35 (-49.6281, 13.2774) -> (-49.2758, 14.3616) projected
  arc A187 (-49.6281, 13.2774) -> (-46.1633, 10.6147) centre (-42.2538, 19.2876) ccw projected
  arc A188 (-45.8857, 10.0296) -> (-46.1633, 10.6147) centre (-46.3687, 10.1589) ccw projected
  arc A189 (-45.8857, 10.0296) -> (-46.125, 9.0978) centre (0, -2.2484) ccw projected
  arc A190 (-46.65, 8.7188) -> (-46.125, 9.0978) centre (-46.6105, 9.2173) ccw projected
  arc A191 (-46.65, 8.7188) -> (-50.9691, 8.0547) centre (-47.4023, -0.7647) ccw projected
  line L36 (-51.1827, 6.9349) -> (-50.9691, 8.0547) projected
  arc A192 (-51.1827, 6.9349) -> (-47.4114, 4.7275) centre (-44.6198, 13.822) ccw projected
  arc A193 (-47.0627, 4.1818) -> (-47.4114, 4.7275) centre (-47.5581, 4.2495) ccw projected
  arc A194 (-47.0627, 4.1818) -> (-47.1833, 3.2274) centre (0, -2.2484) ccw projected
  arc A195 (-47.6567, 2.7856) -> (-47.1833, 3.2274) centre (-47.68, 3.285) ccw projected
  arc A196 (-47.6567, 2.7856) -> (-51.8585, 1.5853) centre (-47.2145, -6.7175) ccw projected
  line L37 (-51.9301, 0.4476) -> (-51.8585, 1.5853) projected
  arc A197 (-51.9301, 0.4476) -> (-47.9119, -1.2698) centre (-46.2821, 8.1029) ccw projected
  arc A198 (-47.4976, -1.7674) -> (-47.9119, -1.2698) centre (-47.9975, -1.7624) ccw projected
  arc A199 (-47.4976, -1.7674) -> (-47.4976, -2.7294) centre (0, -2.2484) ccw projected
  arc A200 (-47.9119, -3.2271) -> (-47.4976, -2.7294) centre (-47.9975, -2.7345) ccw projected
  arc A201 (-47.9119, -3.2271) -> (-51.9301, -4.9445) centre (-46.2821, -12.5998) ccw projected
  line L38 (-51.8585, -6.0822) -> (-51.9301, -4.9445) projected
  arc A202 (-51.8585, -6.0822) -> (-47.6567, -7.2824) centre (-47.2145, 2.2206) ccw projected
  arc A203 (-47.1833, -7.7243) -> (-47.6567, -7.2824) centre (-47.68, -7.7819) ccw projected
  arc A204 (-47.1833, -7.7243) -> (-47.0627, -8.6787) centre (0, -2.2484) ccw projected
  arc A205 (-47.4114, -9.2243) -> (-47.0627, -8.6787) centre (-47.5581, -8.7464) ccw projected
  arc A206 (-47.4114, -9.2243) -> (-51.1827, -11.4318) centre (-44.6198, -18.3188) ccw projected
  line L39 (-50.9691, -12.5516) -> (-51.1827, -11.4318) projected
  arc A207 (-50.9691, -12.5516) -> (-46.65, -13.2157) centre (-47.4023, -3.7322) ccw projected
  arc A208 (-46.125, -13.5947) -> (-46.65, -13.2157) centre (-46.6105, -13.7141) ccw projected
  arc A209 (-46.125, -13.5947) -> (-45.8857, -14.5265) centre (0, -2.2484) ccw projected
  arc A210 (-46.1633, -15.1116) -> (-45.8857, -14.5265) centre (-46.3687, -14.6557) ccw projected
  arc A211 (-46.1633, -15.1116) -> (-49.6281, -17.7743) centre (-42.2538, -23.7845) ccw projected
  line L40 (-49.2758, -18.8585) -> (-49.6281, -17.7743) projected
  arc A212 (-49.2758, -18.8585) -> (-44.9076, -18.976) centre (-46.8426, -9.6616) ccw projected
  arc A213 (-44.3392, -19.2862) -> (-44.9076, -18.976) centre (-44.8059, -19.4656) ccw projected
  arc A214 (-44.3392, -19.2862) -> (-43.985, -20.1807) centre (0, -2.2484) ccw projected
  arc A215 (-44.1871, -20.7959) -> (-43.985, -20.1807) centre (-44.4481, -20.3694) ccw projected
  arc A216 (-44.1871, -20.7959) -> (-47.2909, -23.8719) centre (-39.2214, -28.9105) ccw projected
  line L41 (-46.8055, -24.9034) -> (-47.2909, -23.8719) projected
  arc A217 (-46.8055, -24.9034) -> (-42.457, -24.4725) centre (-45.5441, -15.4741) ccw projected
  arc A218 (-41.8542, -24.7091) -> (-42.457, -24.4725) centre (-42.2947, -24.9455) ccw projected
  arc A219 (-41.8542, -24.7091) -> (-41.3907, -25.5521) centre (0, -2.2484) ccw projected
  arc A220 (-41.514, -26.1878) -> (-41.3907, -25.5521) centre (-41.8264, -25.7974) ccw projected
  arc A221 (-41.514, -26.1878) -> (-44.2078, -29.6285) centre (-35.5705, -33.616) ccw projected
  line L42 (-43.597, -30.591) -> (-44.2078, -29.6285) projected
  arc A222 (-43.597, -30.591) -> (-39.3368, -29.6186) centre (-43.5274, -21.078) ccw projected
  arc A223 (-38.7091, -29.7777) -> (-39.3368, -29.6186) centre (-39.1165, -30.0674) ccw projected
  arc A224 (-38.7091, -29.7777) -> (-38.1436, -30.5559) centre (0, -2.2484) ccw projected
  arc A225 (-38.1863, -31.2021) -> (-38.1436, -30.5559) centre (-38.5451, -30.8539) ccw projected
  arc A226 (-38.1863, -31.2021) -> (-40.4276, -34.9533) centre (-31.3586, -37.8268) ccw projected
  line L43 (-39.7009, -35.8317) -> (-40.4276, -34.9533) projected
  arc A227 (-39.7009, -35.8317) -> (-35.5962, -34.333) centre (-40.8242, -26.3849) ccw projected
  arc A228 (-34.9535, -34.4121) -> (-35.5962, -34.333) centre (-35.3214, -34.7507) ccw projected
  arc A229 (-34.9535, -34.4121) -> (-34.295, -35.1134) centre (0, -2.2484) ccw projected
  arc A230 (-34.2563, -35.7598) -> (-34.295, -35.1134) centre (-34.656, -35.4593) ccw projected
  arc A231 (-34.2563, -35.7598) -> (-36.0098, -39.7623) centre (-26.6522, -41.4765) ccw projected
  line L44 (-35.1788, -40.5427) -> (-36.0098, -39.7623) projected
  arc A232 (-35.1788, -40.5427) -> (-31.2943, -38.5413) centre (-37.4772, -31.3112) ccw projected
  arc A233 (-30.6467, -38.5393) -> (-31.2943, -38.5413) centre (-30.9693, -38.9213) ccw projected
  arc A234 (-30.6467, -38.5393) -> (-29.9055, -39.1525) centre (0, -2.2484) ccw projected
  arc A235 (-29.7861, -39.789) -> (-29.9055, -39.1525) centre (-30.2203, -39.541) ccw projected
  arc A236 (-29.7861, -39.789) -> (-31.0241, -43.9798) centre (-21.5255, -44.5076) ccw projected
  line L45 (-30.1019, -44.6498) -> (-31.0241, -43.9798) projected
  arc A237 (-30.1019, -44.6498) -> (-26.4988, -42.1774) centre (-33.5391, -35.7792) ccw projected
  arc A238 (-25.8566, -42.0942) -> (-26.4988, -42.1774) centre (-26.1288, -42.5137) ccw projected
  arc A239 (-25.8566, -42.0942) -> (-25.0443, -42.6097) centre (0, -2.2484) ccw projected
  arc A240 (-24.8461, -43.2262) -> (-25.0443, -42.6097) centre (-25.308, -43.0345) ccw projected
  arc A241 (-24.8461, -43.2262) -> (-25.5492, -47.539) centre (-16.0593, -46.8722) ccw projected
  line L46 (-24.5502, -48.0882) -> (-25.5492, -47.539) projected
  arc A242 (-24.5502, -48.0882) -> (-21.2854, -45.1837) centre (-29.0721, -39.7184) ccw projected
  arc A243 (-20.6587, -45.0207) -> (-21.2854, -45.1837) centre (-20.8762, -45.471) ccw projected
  arc A244 (-20.6587, -45.0207) -> (-19.7883, -45.4303) centre (0, -2.2484) ccw projected
  arc A245 (-19.5144, -46.0171) -> (-19.7883, -45.4303) centre (-19.9966, -45.8849) ccw projected
  arc A246 (-19.5144, -46.0171) -> (-19.6713, -50.3841) centre (-10.3398, -48.5331) ccw projected
  line L47 (-18.6114, -50.8037) -> (-19.6713, -50.3841) projected
  arc A247 (-18.6114, -50.8037) -> (-15.7364, -47.5129) centre (-24.1467, -43.0666) ccw projected
  arc A248 (-15.135, -47.2727) -> (-15.7364, -47.5129) centre (-15.2943, -47.7466) ccw projected
  arc A249 (-15.135, -47.2727) -> (-14.2201, -47.5699) centre (0, -2.2484) ccw projected
  arc A250 (-13.8748, -48.1178) -> (-14.2201, -47.5699) centre (-14.3698, -48.047) ccw projected
  arc A251 (-13.8748, -48.1178) -> (-13.4832, -52.47) centre (-4.4572, -49.4641) ccw projected
  line L48 (-12.379, -52.7535) -> (-13.4832, -52.47) projected
  arc A252 (-12.379, -52.7535) -> (-9.9391, -49.1283) centre (-18.8404, -45.7711) ccw projected
  arc A253 (-9.3726, -48.8146) -> (-9.9391, -49.1283) centre (-9.4713, -49.3047) ccw projected
  arc A254 (-9.3726, -48.8146) -> (-8.4277, -48.9948) centre (0, -2.2484) ccw projected
  arc A255 (-8.0165, -49.4951) -> (-8.4277, -48.9948) centre (-8.5164, -49.4869) ccw projected
  arc A256 (-8.0165, -49.4951) -> (-7.0824, -53.7639) centre (1.4956, -49.6504) ccw projected
  line L49 (-5.9514, -53.9067) -> (-7.0824, -53.7639) projected
  arc A257 (-5.9514, -53.9067) -> (-3.9852, -50.0043) centre (-13.237, -47.7893) ccw projected
  arc A258 (-3.4624, -49.6221) -> (-3.9852, -50.0043) centre (-3.4989, -50.1207) ccw projected
  arc A259 (-3.4624, -49.6221) -> (-2.5023, -49.6825) centre (0, -2.2484) ccw projected
  arc A260 (-2.0317, -50.1272) -> (-2.5023, -49.6825) centre (-2.5287, -50.1818) ccw projected
  circle A261 centre (0, -2.2484) radius 21
  circle A262 centre (0, 20.7516) radius 6.0312
  circle A263 centre (0, -25.2484) radius 6.0312
  point P0 (-5.3911, -22.5446)
  point P1 (5.3911, -22.5446)
  point P2 (5.3911, 18.0478)
  point P3 (-5.3911, 18.0478)
  dimension "d0" = 42
extrude "돌출1" add sketch "스케치1" along normal blind 5 contours A263 A5 A261 A262 A4 | A263 A5 | A262 A4 picked at (-0.1641, -18.7025) picked at (0.0932, 14.205)
fillet "모깎기1" radius 2 4 edges at (185.5791, 104.8522, -208.3653) (178.0106, 97.1727, -208.3653) (149.0992, 125.6661, -208.3653) (156.6677, 133.3456, -208.3653)
sketch "스케치2" plane through (168.9405, 113.6809, -205.8653) normal (0, 0, 1) x (0.7122354, -0.7019406, 0)
  arc A0 (-22.0831, 6.8982) -> (-21.4528, 4.687) centre (-20.1941, 6.2412) ccw projected
  arc A1 (-21.4528, -4.687) -> (-21.4528, 4.687) centre (-25.2484, 0) ccw projected
  arc A2 (-21.4528, -4.687) -> (-22.0831, -6.8982) centre (-20.1941, -6.2412) ccw projected
  arc A3 (-22.0831, -6.8982) -> (17.5862, -6.8982) centre (-2.2484, 0) ccw projected
  arc A4 (17.5862, -6.8982) -> (16.9559, -4.687) centre (15.6972, -6.2412) ccw projected
  arc A5 (16.9559, 4.687) -> (16.9559, -4.687) centre (20.7516, 0) ccw projected
  arc A6 (16.9559, 4.687) -> (17.5862, 6.8982) centre (15.6972, 6.2412) ccw projected
  arc A7 (17.5862, 6.8982) -> (-22.0831, 6.8982) centre (-2.2484, 0) ccw projected
  circle A8 centre (-14.8834, 12.8202) radius 1.6 projected
  circle A9 centre (10.3865, -12.8202) radius 1.6 projected
  circle A10 centre (-2.372, -16.9701) radius 1.6 projected
  circle A11 centre (-2.1249, 16.9701) radius 1.6 projected
  circle A12 centre (-15.0687, -12.6349) radius 1.6 projected
  circle A13 centre (10.5718, 12.6349) radius 1.6 projected
  circle A14 centre (-2.2484, 0) radius 13 projected
extrude "돌출2" add sketch "스케치2" along normal blind 1
properties part number "큰기어 와셔" material "알루미늄 6061"
